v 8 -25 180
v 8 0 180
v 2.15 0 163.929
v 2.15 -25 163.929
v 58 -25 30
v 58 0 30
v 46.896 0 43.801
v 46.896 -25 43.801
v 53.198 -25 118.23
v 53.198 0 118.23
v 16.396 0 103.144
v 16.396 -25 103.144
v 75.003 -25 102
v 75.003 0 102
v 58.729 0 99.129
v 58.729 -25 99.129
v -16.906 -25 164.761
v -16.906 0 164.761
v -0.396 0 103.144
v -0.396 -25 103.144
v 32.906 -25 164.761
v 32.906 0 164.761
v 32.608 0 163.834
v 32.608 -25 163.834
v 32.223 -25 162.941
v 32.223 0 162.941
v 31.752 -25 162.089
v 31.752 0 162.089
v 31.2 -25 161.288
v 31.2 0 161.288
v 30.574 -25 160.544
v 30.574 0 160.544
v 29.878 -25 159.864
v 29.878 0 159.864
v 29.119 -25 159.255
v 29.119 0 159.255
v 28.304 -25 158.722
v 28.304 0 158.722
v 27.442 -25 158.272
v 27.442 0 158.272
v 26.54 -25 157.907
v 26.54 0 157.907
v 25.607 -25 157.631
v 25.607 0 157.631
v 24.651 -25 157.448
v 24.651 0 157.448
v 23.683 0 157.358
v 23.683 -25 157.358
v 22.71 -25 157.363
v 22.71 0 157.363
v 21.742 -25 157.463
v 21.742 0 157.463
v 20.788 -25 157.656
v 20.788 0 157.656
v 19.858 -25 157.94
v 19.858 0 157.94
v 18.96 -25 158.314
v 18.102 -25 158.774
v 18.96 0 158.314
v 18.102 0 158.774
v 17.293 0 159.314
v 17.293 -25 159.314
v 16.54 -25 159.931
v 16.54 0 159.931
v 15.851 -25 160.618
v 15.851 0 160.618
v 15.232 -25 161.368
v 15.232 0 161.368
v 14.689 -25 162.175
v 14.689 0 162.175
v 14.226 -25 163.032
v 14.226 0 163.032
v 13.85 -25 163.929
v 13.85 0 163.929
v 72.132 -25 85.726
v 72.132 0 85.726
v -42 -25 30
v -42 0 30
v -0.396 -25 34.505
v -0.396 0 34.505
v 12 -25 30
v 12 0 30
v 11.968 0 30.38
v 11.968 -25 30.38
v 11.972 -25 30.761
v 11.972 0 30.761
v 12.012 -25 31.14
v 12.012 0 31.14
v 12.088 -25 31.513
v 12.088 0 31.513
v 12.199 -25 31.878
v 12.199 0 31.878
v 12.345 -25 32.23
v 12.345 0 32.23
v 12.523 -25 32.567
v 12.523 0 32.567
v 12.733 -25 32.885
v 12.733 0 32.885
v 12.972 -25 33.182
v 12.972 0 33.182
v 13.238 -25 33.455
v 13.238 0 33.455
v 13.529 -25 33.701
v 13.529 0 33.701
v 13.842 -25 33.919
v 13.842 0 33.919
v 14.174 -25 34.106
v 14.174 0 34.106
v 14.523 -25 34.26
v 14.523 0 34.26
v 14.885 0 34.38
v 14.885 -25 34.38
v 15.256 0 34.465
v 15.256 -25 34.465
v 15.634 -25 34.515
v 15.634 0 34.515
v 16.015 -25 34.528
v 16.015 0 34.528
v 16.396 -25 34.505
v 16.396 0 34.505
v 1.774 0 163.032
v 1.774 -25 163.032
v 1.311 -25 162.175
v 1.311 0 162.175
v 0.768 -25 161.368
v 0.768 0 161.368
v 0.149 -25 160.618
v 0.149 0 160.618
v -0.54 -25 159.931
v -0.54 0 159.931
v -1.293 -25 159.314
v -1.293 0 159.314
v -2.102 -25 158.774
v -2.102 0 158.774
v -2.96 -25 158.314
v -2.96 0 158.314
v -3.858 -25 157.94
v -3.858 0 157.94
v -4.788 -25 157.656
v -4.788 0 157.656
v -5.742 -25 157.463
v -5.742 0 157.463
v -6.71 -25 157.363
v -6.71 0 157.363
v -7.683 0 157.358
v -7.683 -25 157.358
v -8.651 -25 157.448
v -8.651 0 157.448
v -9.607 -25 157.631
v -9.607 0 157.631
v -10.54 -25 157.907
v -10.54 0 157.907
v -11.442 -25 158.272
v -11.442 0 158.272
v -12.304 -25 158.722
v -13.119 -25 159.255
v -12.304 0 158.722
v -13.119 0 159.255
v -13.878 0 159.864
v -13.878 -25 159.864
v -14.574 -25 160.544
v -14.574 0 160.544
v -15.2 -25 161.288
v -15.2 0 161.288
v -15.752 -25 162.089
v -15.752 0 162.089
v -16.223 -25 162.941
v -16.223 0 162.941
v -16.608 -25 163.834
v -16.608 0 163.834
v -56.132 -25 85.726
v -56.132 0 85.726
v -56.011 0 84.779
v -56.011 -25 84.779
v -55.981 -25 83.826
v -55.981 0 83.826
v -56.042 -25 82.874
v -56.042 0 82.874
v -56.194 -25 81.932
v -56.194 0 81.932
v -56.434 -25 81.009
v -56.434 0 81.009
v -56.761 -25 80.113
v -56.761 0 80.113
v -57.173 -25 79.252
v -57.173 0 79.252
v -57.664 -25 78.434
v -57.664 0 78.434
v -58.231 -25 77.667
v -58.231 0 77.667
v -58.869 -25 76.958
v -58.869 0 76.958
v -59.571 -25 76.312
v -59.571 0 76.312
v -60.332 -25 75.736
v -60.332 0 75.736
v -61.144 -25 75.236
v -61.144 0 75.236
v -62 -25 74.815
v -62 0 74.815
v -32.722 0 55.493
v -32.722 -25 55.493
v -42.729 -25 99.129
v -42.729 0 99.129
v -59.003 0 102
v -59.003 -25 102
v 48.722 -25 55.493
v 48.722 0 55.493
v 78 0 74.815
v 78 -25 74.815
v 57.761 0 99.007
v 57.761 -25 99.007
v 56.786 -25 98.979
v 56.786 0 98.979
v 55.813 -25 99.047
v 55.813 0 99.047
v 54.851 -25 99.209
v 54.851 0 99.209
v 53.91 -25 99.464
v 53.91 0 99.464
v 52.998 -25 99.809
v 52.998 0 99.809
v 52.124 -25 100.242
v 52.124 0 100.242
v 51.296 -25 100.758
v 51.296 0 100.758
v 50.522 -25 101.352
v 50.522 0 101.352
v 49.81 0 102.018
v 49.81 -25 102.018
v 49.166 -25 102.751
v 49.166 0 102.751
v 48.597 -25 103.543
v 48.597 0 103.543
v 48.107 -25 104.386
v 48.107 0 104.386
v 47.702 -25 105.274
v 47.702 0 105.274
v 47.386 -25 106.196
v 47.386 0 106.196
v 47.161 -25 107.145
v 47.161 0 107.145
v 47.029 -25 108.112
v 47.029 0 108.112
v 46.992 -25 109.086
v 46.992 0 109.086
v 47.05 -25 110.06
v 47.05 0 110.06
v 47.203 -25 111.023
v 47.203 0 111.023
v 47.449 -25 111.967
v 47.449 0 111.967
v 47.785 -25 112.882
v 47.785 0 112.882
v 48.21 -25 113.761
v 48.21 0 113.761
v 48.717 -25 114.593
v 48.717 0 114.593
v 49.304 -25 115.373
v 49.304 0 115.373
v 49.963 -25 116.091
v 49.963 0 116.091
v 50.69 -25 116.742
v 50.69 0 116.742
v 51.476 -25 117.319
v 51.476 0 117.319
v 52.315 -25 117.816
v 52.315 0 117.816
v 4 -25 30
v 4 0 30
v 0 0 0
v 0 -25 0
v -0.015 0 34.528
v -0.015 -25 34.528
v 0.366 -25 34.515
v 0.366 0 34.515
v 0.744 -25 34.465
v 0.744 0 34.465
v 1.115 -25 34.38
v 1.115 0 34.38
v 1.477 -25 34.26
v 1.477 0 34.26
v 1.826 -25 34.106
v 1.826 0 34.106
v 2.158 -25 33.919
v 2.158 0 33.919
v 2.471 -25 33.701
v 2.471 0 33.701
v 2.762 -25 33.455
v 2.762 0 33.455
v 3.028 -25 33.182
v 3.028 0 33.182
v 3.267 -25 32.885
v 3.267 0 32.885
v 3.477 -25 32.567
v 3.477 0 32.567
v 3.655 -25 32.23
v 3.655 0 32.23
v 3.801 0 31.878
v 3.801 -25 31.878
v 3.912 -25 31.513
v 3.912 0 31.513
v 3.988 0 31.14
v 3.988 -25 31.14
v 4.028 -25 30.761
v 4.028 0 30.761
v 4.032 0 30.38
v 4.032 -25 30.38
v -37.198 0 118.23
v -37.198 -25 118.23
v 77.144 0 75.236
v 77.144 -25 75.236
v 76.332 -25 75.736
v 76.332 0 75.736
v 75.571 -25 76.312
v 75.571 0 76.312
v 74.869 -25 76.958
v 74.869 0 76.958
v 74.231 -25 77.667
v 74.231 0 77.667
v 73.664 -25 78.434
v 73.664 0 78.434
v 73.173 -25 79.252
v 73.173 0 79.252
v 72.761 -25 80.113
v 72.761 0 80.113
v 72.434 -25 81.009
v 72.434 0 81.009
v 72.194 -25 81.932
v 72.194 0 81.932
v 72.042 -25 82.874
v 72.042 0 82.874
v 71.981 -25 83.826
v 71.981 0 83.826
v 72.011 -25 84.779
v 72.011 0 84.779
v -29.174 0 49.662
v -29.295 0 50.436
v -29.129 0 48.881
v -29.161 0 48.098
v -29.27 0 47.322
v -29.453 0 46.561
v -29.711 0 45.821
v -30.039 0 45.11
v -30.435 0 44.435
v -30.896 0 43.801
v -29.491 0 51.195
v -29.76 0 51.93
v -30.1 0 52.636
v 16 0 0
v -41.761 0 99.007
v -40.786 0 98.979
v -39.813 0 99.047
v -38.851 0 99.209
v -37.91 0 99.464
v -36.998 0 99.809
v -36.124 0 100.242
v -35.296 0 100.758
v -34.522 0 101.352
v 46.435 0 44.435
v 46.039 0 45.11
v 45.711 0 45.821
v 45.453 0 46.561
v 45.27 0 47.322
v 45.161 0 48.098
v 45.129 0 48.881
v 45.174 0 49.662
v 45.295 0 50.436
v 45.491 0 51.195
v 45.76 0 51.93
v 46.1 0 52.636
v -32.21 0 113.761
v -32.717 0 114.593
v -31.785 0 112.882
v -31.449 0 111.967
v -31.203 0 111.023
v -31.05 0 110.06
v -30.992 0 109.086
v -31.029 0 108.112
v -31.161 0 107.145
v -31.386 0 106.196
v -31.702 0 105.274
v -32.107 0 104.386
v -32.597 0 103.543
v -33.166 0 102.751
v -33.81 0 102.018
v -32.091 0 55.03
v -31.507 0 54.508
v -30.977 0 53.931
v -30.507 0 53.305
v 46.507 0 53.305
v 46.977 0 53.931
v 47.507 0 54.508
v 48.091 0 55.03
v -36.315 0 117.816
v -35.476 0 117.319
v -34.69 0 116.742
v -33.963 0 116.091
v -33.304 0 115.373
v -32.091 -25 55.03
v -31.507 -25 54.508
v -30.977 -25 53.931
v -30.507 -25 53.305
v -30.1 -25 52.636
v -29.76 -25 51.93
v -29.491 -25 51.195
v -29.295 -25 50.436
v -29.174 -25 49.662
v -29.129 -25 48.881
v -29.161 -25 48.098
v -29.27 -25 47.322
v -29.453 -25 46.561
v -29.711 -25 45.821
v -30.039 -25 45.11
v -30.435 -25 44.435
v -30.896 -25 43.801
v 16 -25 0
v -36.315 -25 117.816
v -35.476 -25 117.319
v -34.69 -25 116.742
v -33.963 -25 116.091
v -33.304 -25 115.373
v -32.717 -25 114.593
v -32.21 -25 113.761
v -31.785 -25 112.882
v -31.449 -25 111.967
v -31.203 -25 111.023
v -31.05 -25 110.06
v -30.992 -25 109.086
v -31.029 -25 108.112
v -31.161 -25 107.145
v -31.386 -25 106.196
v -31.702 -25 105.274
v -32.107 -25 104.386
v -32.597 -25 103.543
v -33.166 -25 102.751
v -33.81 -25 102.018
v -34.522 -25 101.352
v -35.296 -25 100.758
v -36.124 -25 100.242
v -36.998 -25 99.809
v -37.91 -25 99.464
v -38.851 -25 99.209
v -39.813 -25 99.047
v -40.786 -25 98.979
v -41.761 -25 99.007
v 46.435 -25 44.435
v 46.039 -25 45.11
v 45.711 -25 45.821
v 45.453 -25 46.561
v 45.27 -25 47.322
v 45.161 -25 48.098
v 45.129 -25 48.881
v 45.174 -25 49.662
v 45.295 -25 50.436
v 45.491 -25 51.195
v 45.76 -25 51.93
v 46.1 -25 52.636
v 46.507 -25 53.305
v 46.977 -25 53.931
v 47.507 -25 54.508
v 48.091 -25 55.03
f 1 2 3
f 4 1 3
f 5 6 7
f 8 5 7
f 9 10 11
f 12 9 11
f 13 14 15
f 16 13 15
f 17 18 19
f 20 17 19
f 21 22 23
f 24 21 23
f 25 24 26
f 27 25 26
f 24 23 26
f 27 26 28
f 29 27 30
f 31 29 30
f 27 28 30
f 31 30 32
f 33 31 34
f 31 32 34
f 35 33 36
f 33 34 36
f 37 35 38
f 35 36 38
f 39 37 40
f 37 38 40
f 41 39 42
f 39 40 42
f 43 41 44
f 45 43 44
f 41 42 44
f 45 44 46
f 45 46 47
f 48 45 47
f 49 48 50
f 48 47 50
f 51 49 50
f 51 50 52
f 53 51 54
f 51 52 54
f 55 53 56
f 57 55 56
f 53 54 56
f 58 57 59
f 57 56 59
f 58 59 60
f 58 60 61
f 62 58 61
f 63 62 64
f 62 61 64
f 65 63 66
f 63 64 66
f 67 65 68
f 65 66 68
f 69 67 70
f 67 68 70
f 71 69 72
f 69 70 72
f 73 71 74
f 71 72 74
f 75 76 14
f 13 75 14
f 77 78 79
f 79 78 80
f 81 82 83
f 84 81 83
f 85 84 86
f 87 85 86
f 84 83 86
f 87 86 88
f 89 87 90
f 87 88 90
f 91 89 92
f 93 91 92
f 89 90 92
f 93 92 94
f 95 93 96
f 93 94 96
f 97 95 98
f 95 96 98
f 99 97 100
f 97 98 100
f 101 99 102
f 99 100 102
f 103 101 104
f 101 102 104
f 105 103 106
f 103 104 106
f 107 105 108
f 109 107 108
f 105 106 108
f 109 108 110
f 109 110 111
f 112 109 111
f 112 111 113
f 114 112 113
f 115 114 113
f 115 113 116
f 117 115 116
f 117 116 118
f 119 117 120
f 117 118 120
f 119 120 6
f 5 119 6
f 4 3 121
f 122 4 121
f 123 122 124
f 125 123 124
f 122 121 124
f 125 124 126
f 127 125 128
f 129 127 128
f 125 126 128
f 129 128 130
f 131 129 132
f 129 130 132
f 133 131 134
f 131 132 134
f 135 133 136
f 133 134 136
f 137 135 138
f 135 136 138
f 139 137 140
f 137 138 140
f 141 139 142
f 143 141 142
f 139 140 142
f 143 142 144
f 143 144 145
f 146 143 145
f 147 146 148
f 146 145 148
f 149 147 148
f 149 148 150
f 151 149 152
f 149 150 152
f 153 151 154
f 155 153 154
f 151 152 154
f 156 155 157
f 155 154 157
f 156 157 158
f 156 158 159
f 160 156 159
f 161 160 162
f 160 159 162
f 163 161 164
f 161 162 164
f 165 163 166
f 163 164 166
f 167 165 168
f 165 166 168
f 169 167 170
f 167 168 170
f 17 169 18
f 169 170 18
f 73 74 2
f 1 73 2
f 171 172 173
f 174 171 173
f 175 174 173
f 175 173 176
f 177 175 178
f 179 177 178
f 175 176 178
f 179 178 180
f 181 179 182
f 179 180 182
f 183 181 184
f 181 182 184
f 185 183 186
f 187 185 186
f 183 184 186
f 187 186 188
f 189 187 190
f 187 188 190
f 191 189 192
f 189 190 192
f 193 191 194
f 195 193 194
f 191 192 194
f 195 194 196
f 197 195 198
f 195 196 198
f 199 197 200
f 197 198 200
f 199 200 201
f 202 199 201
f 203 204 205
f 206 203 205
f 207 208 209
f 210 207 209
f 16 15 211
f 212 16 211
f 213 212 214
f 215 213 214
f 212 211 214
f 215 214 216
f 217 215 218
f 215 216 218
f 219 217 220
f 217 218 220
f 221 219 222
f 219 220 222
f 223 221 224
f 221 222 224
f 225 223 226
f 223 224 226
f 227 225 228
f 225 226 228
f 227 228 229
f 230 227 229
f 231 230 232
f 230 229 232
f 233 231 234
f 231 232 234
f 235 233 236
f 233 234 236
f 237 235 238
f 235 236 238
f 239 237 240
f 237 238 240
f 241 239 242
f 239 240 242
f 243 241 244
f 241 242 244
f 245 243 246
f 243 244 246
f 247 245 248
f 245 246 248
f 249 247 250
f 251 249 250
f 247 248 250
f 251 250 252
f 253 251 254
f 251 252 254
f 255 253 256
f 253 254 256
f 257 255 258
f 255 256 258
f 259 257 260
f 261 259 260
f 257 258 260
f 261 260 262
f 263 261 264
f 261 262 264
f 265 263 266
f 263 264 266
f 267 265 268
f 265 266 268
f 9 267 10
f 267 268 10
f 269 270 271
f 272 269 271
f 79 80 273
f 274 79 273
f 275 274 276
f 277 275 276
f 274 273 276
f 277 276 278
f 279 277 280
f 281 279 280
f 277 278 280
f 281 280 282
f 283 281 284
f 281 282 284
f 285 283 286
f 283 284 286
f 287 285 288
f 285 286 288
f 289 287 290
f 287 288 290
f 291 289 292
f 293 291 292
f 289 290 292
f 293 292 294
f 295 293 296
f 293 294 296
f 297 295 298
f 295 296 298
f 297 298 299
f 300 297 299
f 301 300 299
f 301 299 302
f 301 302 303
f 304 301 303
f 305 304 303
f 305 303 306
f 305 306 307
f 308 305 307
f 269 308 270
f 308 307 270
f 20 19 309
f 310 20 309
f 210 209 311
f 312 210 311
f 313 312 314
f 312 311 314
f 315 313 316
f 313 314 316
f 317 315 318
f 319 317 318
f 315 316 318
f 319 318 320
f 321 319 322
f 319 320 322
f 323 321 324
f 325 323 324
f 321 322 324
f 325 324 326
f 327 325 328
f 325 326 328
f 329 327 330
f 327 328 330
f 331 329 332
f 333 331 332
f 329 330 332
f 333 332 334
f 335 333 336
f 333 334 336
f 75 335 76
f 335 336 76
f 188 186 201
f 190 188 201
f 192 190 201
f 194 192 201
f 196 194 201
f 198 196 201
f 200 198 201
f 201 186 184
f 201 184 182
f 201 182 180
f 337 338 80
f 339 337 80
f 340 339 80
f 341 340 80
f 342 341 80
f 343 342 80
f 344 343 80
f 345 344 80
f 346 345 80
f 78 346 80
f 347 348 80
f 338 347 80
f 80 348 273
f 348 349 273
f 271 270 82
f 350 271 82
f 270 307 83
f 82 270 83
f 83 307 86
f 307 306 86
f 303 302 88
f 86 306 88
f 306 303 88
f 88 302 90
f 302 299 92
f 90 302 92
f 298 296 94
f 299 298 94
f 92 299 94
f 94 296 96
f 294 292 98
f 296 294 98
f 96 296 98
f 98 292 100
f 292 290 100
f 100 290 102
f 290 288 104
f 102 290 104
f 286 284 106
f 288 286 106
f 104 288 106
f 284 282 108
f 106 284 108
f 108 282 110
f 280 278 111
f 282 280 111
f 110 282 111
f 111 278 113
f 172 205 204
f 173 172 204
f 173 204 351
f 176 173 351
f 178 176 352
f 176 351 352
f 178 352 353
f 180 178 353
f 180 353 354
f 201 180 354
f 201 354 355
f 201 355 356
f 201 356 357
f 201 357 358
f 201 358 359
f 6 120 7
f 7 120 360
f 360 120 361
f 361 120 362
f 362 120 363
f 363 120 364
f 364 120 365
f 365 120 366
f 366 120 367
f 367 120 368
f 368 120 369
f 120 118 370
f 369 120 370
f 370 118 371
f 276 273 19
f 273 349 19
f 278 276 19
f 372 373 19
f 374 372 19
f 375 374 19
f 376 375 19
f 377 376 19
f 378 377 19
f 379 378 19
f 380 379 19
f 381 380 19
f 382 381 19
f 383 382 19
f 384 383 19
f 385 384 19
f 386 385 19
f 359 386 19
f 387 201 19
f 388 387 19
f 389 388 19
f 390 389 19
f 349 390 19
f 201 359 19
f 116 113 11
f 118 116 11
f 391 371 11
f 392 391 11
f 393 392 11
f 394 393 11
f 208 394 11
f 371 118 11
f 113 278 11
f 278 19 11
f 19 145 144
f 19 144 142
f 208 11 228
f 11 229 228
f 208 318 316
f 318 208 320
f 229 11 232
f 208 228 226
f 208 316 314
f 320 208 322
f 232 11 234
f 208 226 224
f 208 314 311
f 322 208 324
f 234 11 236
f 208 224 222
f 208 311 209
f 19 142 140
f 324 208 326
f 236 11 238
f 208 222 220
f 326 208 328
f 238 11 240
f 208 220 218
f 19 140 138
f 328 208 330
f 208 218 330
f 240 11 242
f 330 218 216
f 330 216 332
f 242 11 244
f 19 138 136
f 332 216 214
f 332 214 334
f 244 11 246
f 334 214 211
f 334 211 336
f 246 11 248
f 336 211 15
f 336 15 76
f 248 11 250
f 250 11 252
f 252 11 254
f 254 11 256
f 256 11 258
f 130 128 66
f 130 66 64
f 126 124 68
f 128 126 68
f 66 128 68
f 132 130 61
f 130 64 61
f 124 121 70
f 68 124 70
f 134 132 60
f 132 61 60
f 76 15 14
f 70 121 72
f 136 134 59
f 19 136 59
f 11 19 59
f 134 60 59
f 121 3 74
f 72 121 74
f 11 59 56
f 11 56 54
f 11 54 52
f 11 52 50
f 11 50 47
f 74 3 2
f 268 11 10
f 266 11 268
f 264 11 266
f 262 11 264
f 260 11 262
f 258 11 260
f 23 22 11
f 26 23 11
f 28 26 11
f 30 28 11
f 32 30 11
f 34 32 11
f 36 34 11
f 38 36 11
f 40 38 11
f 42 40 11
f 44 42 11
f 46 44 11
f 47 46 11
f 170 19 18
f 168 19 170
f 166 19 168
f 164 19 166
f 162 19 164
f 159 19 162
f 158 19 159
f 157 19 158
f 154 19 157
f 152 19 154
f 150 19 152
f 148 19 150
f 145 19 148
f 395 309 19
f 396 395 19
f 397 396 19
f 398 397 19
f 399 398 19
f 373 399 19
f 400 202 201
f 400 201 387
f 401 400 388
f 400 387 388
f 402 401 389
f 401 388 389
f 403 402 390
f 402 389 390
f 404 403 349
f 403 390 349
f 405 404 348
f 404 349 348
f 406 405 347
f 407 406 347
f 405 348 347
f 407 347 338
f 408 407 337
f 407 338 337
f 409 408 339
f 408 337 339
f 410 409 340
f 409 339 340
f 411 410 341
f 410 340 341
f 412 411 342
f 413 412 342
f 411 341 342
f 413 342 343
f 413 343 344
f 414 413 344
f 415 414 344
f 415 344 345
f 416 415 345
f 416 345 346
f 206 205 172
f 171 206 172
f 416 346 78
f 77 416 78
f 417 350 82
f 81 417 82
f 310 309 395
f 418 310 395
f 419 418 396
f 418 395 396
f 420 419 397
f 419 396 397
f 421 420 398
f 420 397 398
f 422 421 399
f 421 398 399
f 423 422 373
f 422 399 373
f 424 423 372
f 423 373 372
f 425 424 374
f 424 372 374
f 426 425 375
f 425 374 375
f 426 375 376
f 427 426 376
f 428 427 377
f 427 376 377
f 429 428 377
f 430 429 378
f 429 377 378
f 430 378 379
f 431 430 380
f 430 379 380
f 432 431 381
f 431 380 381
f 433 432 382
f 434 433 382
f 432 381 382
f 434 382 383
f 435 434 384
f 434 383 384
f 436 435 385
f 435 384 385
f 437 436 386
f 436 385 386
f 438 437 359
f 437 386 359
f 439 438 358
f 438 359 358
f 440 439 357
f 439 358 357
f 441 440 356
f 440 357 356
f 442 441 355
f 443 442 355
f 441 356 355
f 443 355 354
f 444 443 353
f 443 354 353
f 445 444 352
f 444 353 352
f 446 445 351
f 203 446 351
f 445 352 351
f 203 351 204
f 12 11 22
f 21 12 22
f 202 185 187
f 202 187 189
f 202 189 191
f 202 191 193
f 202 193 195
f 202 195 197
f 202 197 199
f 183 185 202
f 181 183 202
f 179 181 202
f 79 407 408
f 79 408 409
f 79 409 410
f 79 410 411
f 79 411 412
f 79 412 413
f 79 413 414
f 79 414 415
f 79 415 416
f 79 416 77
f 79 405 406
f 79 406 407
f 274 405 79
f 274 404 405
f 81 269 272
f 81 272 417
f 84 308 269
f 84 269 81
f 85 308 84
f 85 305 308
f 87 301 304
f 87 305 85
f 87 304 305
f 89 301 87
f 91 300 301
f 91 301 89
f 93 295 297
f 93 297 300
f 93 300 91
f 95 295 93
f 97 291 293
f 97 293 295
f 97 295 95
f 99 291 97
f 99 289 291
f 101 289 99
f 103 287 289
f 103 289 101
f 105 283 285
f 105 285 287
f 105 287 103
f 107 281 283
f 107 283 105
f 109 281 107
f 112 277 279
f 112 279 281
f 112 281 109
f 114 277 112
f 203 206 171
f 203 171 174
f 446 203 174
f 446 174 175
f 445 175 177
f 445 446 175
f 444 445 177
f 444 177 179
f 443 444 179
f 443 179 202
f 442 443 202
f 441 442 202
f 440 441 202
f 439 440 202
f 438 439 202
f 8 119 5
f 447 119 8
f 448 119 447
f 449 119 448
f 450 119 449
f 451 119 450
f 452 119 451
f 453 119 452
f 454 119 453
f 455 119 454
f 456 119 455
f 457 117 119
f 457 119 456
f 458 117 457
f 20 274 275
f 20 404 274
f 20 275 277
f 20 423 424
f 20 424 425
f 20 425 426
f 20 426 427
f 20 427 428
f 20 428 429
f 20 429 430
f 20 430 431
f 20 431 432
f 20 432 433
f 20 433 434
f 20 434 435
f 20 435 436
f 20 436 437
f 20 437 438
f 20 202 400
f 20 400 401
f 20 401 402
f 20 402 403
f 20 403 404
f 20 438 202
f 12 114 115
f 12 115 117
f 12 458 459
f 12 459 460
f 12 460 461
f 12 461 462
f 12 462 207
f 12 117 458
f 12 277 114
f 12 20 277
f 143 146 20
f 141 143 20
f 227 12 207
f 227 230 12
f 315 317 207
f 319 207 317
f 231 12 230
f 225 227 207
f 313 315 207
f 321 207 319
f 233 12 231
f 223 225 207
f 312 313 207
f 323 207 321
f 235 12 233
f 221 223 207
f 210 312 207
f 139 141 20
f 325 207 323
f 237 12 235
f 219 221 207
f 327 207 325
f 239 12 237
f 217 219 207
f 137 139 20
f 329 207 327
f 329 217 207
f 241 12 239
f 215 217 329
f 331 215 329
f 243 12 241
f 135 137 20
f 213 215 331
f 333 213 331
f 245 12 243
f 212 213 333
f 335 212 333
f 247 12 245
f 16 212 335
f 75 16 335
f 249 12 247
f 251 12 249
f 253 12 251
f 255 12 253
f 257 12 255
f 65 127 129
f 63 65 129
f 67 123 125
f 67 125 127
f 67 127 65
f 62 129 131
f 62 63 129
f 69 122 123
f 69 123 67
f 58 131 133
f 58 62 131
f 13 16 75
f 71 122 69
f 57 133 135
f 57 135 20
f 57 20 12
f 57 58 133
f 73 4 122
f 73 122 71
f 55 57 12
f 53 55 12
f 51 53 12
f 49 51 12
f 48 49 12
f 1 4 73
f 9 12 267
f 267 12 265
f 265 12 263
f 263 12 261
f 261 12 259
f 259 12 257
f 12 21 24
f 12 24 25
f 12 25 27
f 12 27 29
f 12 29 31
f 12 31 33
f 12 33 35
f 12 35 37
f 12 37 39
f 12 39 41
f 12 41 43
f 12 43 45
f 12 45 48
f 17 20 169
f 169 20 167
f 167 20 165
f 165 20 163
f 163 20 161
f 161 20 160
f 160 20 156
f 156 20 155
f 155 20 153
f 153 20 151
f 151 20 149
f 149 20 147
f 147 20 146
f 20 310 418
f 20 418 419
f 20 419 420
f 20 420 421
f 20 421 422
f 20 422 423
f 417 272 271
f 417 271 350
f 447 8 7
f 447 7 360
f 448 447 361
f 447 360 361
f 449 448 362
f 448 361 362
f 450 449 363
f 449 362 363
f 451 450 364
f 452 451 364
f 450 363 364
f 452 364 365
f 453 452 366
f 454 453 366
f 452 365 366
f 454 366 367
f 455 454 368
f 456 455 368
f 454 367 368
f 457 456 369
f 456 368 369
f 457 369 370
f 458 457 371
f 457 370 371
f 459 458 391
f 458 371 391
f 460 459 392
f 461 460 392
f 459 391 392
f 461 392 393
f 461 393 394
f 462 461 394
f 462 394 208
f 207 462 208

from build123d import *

# Parameters (mm, degrees)
F1_DEPTH = 25


with BuildPart() as f1:
    # F0 (on Front) → F1 (new body)
    with BuildSketch(Plane.XZ):
        with BuildLine():
            Line((4, 30), (0, 0))
            Line((0, 0), (16, 0))
            Line((16, 0), (12, 30))
            ThreePointArc((12, 30), (13.101797, 33.321964), (16.39556, 34.505405))
            Line((16.39556, 34.505405), (58, 30))
            Line((58, 30), (46.895875, 43.801154))
            ThreePointArc((46.895875, 43.801154), (45.224745, 50.050887), (48.722404, 55.493149))
            Line((48.722404, 55.493149), (78, 74.814698))
            ThreePointArc((78, 74.814698), (73.172757, 79.252073), (72.131917, 85.725807))
            Line((72.131917, 85.725807), (75.002716, 102))
            Line((75.002716, 102), (58.728522, 99.129201))
            ThreePointArc((58.728522, 99.129201), (47.385802, 106.196158), (53.198466, 118.229948))
            Line((53.198466, 118.229948), (16.39556, 103.143887))
            Line((16.39556, 103.143887), (32.905704, 164.760587))
            ThreePointArc((32.905704, 164.760587), (23.68264, 157.358295), (13.84952, 163.928576))
            Line((13.84952, 163.928576), (8, 180))
            Line((8, 180), (2.15048, 163.928576))
            ThreePointArc((2.15048, 163.928576), (-7.68264, 157.358295), (-16.905704, 164.760587))
            Line((-16.905704, 164.760587), (-0.39556, 103.143887))
            Line((-0.39556, 103.143887), (-37.198466, 118.229948))
            ThreePointArc((-37.198466, 118.229948), (-31.385802, 106.196158), (-42.728522, 99.129201))
            Line((-42.728522, 99.129201), (-59.002716, 102))
            Line((-59.002716, 102), (-56.131917, 85.725807))
            ThreePointArc((-56.131917, 85.725807), (-57.172757, 79.252073), (-62, 74.814698))
            Line((-62, 74.814698), (-32.722404, 55.493149))
            ThreePointArc((-32.722404, 55.493149), (-29.224745, 50.050887), (-30.895875, 43.801154))
            Line((-30.895875, 43.801154), (-42, 30))
            Line((-42, 30), (-0.39556, 34.505405))
            ThreePointArc((-0.39556, 34.505405), (2.898203, 33.321964), (4, 30))
        make_face()
    extrude(amount=F1_DEPTH)


solid = f1.part
